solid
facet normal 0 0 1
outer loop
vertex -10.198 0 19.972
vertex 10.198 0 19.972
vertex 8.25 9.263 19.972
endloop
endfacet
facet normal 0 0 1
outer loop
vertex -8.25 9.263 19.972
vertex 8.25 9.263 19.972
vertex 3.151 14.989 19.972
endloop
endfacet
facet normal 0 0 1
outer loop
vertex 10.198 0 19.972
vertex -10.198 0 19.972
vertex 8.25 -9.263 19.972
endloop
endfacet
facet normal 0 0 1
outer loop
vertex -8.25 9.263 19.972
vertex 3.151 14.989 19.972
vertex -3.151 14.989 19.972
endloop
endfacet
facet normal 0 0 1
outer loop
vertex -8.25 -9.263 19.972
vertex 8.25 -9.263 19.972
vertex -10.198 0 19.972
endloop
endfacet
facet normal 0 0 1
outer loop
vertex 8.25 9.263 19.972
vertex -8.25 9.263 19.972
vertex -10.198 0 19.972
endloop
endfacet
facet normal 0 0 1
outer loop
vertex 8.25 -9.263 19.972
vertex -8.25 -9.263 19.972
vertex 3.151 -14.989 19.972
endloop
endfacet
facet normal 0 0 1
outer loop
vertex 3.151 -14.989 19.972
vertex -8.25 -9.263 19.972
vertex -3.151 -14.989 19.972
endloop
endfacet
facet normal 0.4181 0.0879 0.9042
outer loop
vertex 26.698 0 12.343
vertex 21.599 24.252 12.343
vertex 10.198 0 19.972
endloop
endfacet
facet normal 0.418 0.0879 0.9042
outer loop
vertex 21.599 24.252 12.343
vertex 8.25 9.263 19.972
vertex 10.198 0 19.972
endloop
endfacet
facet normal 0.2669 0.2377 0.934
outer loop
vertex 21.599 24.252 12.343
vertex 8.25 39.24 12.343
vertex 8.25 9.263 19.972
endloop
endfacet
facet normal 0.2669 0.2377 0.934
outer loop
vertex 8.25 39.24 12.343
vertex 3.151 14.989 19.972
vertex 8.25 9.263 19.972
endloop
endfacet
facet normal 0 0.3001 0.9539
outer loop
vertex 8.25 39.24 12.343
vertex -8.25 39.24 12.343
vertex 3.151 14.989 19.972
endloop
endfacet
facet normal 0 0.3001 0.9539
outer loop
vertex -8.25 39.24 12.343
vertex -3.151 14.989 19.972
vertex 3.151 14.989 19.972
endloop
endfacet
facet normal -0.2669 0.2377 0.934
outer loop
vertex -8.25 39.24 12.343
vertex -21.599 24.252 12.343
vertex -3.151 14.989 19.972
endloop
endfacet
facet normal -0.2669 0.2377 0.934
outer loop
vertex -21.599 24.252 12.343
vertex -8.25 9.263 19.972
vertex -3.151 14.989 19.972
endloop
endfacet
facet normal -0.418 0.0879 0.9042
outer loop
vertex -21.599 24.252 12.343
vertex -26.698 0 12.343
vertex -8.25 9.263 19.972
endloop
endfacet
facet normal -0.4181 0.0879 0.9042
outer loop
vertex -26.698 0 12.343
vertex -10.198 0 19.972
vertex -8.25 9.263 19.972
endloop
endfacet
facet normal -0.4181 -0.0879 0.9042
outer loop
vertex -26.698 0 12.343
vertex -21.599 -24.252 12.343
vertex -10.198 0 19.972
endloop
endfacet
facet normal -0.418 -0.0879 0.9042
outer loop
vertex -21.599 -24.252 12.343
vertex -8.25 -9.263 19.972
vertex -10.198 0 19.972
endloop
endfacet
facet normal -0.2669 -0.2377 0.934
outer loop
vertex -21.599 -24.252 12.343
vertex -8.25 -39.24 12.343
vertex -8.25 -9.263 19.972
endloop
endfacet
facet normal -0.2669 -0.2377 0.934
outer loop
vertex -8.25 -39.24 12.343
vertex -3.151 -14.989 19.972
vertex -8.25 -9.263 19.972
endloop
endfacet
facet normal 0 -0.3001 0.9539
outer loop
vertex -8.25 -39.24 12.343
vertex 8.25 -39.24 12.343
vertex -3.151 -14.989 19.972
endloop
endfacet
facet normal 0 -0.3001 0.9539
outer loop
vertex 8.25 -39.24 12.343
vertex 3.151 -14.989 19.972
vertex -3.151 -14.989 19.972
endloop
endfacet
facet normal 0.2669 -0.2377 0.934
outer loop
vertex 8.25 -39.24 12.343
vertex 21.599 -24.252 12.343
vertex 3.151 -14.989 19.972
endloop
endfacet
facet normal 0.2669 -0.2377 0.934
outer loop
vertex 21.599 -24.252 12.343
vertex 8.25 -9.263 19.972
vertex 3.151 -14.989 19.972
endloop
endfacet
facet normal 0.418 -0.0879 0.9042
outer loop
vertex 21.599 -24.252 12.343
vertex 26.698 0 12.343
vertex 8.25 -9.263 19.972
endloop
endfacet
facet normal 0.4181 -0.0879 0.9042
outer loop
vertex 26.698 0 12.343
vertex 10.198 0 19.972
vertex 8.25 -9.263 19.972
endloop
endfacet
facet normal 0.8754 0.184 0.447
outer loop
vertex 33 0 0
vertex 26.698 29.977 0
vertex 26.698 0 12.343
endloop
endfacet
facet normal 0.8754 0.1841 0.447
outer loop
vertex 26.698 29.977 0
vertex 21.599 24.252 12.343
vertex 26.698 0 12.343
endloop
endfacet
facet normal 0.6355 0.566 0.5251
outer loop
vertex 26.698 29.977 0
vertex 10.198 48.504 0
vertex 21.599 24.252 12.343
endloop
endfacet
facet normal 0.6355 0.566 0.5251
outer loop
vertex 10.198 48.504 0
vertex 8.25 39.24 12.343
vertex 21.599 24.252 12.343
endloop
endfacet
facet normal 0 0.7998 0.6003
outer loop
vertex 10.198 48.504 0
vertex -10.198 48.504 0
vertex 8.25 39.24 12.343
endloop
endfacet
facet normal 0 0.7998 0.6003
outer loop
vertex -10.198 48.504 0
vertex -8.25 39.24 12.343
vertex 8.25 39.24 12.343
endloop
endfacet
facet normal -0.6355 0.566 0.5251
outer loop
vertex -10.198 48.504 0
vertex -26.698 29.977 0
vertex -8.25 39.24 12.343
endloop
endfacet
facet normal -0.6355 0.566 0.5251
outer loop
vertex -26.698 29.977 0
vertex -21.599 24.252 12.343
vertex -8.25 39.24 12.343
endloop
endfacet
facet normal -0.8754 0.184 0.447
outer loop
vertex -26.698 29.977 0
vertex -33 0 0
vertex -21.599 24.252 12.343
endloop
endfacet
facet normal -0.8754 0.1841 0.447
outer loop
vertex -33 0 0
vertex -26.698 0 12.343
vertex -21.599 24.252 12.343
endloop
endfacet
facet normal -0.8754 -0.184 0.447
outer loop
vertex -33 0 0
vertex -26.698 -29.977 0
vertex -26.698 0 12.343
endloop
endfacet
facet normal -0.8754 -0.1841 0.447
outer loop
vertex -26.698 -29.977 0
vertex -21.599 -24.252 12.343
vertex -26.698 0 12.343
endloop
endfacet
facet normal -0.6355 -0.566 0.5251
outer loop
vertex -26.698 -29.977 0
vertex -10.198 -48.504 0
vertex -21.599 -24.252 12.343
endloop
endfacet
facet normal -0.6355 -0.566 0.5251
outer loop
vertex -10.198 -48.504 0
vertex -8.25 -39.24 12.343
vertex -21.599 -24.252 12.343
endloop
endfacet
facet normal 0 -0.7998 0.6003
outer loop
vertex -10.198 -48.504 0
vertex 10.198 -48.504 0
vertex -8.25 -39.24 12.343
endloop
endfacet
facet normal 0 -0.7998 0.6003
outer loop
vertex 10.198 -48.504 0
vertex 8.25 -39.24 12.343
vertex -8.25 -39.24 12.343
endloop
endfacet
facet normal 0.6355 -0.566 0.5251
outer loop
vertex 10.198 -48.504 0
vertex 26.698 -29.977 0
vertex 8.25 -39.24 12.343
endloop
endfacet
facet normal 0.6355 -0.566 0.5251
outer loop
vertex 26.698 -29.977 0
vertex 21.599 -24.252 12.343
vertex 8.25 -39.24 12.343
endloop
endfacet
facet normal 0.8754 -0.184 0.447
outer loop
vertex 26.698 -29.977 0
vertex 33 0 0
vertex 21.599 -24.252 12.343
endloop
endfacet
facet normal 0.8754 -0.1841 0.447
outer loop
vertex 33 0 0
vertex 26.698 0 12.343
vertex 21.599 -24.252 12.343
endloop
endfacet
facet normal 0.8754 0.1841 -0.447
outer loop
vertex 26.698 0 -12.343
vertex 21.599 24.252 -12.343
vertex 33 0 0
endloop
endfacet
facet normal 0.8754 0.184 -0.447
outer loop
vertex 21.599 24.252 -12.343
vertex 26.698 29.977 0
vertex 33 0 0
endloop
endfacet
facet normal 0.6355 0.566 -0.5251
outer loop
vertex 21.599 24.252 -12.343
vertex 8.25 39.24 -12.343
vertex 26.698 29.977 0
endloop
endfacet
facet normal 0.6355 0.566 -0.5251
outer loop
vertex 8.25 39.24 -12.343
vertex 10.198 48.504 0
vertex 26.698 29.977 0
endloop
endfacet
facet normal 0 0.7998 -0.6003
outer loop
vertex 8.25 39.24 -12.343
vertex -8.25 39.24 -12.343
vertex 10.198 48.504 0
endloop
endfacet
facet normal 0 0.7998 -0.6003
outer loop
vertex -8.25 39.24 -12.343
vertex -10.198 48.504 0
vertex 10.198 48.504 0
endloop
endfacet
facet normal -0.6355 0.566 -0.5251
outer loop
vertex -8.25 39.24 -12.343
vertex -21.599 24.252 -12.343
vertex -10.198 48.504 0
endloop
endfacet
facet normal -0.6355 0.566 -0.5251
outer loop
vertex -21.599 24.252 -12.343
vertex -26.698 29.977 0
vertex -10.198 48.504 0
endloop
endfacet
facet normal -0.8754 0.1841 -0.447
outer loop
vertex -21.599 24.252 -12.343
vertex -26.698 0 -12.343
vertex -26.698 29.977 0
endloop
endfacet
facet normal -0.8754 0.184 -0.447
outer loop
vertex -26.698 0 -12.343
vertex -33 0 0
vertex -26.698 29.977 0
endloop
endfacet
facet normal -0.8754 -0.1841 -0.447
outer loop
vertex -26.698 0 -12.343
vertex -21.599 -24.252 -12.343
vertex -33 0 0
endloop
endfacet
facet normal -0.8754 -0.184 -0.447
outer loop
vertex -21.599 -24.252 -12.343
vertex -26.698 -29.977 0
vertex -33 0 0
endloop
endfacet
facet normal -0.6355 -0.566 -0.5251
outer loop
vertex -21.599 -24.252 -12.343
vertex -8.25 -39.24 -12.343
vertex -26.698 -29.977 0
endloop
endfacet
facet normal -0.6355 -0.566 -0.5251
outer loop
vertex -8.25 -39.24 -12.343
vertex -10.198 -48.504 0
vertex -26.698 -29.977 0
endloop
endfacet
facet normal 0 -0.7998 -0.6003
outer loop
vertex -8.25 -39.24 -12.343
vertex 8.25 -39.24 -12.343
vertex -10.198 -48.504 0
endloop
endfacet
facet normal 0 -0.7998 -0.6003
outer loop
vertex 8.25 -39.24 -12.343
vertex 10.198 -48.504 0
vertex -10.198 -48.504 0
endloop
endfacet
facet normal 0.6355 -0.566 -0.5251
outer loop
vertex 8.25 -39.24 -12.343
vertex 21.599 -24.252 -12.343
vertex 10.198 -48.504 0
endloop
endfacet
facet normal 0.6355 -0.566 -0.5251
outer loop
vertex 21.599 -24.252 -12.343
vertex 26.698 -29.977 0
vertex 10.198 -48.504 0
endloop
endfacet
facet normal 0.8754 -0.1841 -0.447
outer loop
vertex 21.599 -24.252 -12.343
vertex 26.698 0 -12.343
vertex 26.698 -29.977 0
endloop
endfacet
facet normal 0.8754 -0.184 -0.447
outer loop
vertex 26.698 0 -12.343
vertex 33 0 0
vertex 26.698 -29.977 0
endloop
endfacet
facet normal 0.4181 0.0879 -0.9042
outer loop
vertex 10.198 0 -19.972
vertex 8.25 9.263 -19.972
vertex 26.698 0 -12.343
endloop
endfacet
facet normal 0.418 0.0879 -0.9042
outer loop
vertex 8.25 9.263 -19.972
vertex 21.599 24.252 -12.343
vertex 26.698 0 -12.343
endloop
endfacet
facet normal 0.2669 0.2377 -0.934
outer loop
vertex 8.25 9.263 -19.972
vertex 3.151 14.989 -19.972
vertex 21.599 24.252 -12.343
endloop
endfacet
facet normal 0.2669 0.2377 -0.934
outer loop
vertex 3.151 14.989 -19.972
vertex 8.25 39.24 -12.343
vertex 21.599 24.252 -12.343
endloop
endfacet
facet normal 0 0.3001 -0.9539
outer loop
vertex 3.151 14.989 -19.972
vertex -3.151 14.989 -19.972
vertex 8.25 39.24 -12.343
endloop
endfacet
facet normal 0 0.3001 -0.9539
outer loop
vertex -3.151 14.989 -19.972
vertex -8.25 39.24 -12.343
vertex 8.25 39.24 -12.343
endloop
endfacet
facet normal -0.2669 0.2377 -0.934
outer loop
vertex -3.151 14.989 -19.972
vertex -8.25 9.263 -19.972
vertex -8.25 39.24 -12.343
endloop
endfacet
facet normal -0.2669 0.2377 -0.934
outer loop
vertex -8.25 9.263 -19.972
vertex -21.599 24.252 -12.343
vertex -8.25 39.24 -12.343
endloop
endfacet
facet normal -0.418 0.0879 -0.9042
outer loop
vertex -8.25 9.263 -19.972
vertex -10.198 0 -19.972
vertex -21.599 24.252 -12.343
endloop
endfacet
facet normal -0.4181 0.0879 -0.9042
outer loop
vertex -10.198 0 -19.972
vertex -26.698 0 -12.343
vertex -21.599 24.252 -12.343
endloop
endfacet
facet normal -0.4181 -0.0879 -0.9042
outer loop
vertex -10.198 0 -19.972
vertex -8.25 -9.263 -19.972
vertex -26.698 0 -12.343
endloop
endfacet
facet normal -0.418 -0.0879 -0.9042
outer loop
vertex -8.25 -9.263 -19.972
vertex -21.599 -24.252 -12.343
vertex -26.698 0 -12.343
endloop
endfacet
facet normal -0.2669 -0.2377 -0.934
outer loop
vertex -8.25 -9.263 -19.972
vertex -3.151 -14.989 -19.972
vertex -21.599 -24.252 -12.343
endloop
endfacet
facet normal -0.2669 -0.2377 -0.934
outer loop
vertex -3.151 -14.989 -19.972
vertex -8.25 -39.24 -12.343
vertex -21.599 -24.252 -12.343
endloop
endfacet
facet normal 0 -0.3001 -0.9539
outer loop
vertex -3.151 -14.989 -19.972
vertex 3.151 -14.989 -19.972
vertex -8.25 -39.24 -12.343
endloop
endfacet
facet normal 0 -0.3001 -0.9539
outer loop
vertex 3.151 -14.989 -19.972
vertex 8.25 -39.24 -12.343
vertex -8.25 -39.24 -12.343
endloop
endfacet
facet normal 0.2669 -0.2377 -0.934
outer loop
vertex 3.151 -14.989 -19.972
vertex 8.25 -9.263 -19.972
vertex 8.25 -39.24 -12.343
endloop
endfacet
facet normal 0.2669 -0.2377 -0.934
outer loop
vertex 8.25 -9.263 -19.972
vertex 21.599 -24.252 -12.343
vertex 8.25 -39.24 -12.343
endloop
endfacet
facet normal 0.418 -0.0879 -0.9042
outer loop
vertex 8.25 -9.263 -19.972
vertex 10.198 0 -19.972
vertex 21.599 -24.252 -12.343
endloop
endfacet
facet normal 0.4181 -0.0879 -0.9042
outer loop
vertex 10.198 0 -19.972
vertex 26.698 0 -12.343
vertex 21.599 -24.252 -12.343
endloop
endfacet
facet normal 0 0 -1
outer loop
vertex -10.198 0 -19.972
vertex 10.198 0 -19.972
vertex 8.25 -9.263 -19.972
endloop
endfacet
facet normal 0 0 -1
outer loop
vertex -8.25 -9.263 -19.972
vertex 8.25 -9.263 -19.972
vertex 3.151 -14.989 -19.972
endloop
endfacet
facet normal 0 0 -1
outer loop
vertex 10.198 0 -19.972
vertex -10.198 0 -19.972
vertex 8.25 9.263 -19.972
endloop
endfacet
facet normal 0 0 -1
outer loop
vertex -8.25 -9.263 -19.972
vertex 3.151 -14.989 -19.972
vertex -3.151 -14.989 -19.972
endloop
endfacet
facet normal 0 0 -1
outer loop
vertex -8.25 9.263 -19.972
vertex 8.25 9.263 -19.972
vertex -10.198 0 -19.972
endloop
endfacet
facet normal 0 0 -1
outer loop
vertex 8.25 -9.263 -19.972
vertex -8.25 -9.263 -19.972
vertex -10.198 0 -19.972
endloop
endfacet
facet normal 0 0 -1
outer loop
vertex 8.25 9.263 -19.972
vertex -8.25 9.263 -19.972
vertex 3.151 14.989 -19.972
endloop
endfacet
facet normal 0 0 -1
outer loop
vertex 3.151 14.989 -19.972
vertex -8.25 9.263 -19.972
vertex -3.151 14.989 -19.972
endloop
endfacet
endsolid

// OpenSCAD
// Generated by SolidPython 1.0.1 on 2020-07-29 00:46:50


scale(v = [11, 17, 7]) {
	sphere(r = 3);
}
/***********************************************
*********      SolidPython code:      **********
************************************************
 
# import packages: SolidPython
from solid import *
from solid.utils import *
from itertools import chain, combinations, permutations


class Resize:

    def __init__(self, scad_file):
        self.scad_file = scad_file
        #self.scad_file = import_scad(scad_file)
        # cone/cylinder param:
        self.r1 = 0
        self.r2 = 0
        self.h = 0
        # rectangular prism param:
        self.w = 0
        self.l = 0
        # ellipse param:
        self.r = 0

    # import OpenScad code (file name corresponds to shape)


    # classify shape + parameters
    def assign(self, param1, param2, param3):
        if self.scad_file == 'cone.scad':
            self.r1 = param1
            self.r2 = param2
            self.h = param3
        elif self.scad_file == 'cylinder.scad':
            self.r1 = param1
            self.r2 = param2
            self.h = param3
        elif self.scad_file == 'rectangularPrism.scad':
            self.h = param1
            self.l = param2
            self.w = param3
        else:
            self.r = param1
            self.h = param2

    # resize parameters
    def iterate(self):
        x = range(3, 20, 2)
        i = 1
        if self.scad_file == 'cone.scad':
            tempList = list(permutations(x, 2))
            for temp in tempList:
                param1 = temp[0]
                param2 = temp[1]
                filepath = 'produced_scad_files/' + 'cone' + str(param1) + '_' + str(param2) + '_' + '.scad'
                scad_render_to_file(cylinder(h=param1, r1=param2, r2=0), filepath)

        elif self.scad_file == 'cylinder.scad':
            tempList = list(permutations(x, 3))
            for temp in tempList:
                param1 = temp[0]
                param2 = temp[1]
                filepath = 'produced_scad_files/' + 'cylinder' + str(param1) + '_' + str(param2) + '_' + '.scad'
                scad_render_to_file(cylinder(h=param1, r1=param2, r2=param2), filepath)

        elif self.scad_file == 'rectangularPrism.scad':
            tempList = list(permutations(x, 3))
            for temp in tempList:
                param1 = temp[0]
                param2 = temp[1]
                param3 = temp[2]
                filepath = 'produced_scad_files/' + 'rectangularPrism' + str(param1) + '_' + str(param2) + '_' + str(
                    param3) + '.scad'
                scad_render_to_file(cube(size=(param1, param2, param3)), filepath)

        elif self.scad_file == 'ellipse.scad':
            tempList = list(permutations(x, 4))
            for temp in tempList:
                param1 = temp[0]
                param2 = temp[1]
                param3 = temp[2]
                param4 = temp[3]
                filepath = 'produced_scad_files/' + 'ellipse' + str(param1) + '_' + str(param2) + '_' + str(param3) + '_' + str(param4) + '.scad'
                scad_render_to_file(scale([param1, param2, param3])(sphere(r=param4)), filepath)

    def render_to_scadfile(self):
        scad_render_to_file(scad, 'example.scad') 
 
************************************************/
